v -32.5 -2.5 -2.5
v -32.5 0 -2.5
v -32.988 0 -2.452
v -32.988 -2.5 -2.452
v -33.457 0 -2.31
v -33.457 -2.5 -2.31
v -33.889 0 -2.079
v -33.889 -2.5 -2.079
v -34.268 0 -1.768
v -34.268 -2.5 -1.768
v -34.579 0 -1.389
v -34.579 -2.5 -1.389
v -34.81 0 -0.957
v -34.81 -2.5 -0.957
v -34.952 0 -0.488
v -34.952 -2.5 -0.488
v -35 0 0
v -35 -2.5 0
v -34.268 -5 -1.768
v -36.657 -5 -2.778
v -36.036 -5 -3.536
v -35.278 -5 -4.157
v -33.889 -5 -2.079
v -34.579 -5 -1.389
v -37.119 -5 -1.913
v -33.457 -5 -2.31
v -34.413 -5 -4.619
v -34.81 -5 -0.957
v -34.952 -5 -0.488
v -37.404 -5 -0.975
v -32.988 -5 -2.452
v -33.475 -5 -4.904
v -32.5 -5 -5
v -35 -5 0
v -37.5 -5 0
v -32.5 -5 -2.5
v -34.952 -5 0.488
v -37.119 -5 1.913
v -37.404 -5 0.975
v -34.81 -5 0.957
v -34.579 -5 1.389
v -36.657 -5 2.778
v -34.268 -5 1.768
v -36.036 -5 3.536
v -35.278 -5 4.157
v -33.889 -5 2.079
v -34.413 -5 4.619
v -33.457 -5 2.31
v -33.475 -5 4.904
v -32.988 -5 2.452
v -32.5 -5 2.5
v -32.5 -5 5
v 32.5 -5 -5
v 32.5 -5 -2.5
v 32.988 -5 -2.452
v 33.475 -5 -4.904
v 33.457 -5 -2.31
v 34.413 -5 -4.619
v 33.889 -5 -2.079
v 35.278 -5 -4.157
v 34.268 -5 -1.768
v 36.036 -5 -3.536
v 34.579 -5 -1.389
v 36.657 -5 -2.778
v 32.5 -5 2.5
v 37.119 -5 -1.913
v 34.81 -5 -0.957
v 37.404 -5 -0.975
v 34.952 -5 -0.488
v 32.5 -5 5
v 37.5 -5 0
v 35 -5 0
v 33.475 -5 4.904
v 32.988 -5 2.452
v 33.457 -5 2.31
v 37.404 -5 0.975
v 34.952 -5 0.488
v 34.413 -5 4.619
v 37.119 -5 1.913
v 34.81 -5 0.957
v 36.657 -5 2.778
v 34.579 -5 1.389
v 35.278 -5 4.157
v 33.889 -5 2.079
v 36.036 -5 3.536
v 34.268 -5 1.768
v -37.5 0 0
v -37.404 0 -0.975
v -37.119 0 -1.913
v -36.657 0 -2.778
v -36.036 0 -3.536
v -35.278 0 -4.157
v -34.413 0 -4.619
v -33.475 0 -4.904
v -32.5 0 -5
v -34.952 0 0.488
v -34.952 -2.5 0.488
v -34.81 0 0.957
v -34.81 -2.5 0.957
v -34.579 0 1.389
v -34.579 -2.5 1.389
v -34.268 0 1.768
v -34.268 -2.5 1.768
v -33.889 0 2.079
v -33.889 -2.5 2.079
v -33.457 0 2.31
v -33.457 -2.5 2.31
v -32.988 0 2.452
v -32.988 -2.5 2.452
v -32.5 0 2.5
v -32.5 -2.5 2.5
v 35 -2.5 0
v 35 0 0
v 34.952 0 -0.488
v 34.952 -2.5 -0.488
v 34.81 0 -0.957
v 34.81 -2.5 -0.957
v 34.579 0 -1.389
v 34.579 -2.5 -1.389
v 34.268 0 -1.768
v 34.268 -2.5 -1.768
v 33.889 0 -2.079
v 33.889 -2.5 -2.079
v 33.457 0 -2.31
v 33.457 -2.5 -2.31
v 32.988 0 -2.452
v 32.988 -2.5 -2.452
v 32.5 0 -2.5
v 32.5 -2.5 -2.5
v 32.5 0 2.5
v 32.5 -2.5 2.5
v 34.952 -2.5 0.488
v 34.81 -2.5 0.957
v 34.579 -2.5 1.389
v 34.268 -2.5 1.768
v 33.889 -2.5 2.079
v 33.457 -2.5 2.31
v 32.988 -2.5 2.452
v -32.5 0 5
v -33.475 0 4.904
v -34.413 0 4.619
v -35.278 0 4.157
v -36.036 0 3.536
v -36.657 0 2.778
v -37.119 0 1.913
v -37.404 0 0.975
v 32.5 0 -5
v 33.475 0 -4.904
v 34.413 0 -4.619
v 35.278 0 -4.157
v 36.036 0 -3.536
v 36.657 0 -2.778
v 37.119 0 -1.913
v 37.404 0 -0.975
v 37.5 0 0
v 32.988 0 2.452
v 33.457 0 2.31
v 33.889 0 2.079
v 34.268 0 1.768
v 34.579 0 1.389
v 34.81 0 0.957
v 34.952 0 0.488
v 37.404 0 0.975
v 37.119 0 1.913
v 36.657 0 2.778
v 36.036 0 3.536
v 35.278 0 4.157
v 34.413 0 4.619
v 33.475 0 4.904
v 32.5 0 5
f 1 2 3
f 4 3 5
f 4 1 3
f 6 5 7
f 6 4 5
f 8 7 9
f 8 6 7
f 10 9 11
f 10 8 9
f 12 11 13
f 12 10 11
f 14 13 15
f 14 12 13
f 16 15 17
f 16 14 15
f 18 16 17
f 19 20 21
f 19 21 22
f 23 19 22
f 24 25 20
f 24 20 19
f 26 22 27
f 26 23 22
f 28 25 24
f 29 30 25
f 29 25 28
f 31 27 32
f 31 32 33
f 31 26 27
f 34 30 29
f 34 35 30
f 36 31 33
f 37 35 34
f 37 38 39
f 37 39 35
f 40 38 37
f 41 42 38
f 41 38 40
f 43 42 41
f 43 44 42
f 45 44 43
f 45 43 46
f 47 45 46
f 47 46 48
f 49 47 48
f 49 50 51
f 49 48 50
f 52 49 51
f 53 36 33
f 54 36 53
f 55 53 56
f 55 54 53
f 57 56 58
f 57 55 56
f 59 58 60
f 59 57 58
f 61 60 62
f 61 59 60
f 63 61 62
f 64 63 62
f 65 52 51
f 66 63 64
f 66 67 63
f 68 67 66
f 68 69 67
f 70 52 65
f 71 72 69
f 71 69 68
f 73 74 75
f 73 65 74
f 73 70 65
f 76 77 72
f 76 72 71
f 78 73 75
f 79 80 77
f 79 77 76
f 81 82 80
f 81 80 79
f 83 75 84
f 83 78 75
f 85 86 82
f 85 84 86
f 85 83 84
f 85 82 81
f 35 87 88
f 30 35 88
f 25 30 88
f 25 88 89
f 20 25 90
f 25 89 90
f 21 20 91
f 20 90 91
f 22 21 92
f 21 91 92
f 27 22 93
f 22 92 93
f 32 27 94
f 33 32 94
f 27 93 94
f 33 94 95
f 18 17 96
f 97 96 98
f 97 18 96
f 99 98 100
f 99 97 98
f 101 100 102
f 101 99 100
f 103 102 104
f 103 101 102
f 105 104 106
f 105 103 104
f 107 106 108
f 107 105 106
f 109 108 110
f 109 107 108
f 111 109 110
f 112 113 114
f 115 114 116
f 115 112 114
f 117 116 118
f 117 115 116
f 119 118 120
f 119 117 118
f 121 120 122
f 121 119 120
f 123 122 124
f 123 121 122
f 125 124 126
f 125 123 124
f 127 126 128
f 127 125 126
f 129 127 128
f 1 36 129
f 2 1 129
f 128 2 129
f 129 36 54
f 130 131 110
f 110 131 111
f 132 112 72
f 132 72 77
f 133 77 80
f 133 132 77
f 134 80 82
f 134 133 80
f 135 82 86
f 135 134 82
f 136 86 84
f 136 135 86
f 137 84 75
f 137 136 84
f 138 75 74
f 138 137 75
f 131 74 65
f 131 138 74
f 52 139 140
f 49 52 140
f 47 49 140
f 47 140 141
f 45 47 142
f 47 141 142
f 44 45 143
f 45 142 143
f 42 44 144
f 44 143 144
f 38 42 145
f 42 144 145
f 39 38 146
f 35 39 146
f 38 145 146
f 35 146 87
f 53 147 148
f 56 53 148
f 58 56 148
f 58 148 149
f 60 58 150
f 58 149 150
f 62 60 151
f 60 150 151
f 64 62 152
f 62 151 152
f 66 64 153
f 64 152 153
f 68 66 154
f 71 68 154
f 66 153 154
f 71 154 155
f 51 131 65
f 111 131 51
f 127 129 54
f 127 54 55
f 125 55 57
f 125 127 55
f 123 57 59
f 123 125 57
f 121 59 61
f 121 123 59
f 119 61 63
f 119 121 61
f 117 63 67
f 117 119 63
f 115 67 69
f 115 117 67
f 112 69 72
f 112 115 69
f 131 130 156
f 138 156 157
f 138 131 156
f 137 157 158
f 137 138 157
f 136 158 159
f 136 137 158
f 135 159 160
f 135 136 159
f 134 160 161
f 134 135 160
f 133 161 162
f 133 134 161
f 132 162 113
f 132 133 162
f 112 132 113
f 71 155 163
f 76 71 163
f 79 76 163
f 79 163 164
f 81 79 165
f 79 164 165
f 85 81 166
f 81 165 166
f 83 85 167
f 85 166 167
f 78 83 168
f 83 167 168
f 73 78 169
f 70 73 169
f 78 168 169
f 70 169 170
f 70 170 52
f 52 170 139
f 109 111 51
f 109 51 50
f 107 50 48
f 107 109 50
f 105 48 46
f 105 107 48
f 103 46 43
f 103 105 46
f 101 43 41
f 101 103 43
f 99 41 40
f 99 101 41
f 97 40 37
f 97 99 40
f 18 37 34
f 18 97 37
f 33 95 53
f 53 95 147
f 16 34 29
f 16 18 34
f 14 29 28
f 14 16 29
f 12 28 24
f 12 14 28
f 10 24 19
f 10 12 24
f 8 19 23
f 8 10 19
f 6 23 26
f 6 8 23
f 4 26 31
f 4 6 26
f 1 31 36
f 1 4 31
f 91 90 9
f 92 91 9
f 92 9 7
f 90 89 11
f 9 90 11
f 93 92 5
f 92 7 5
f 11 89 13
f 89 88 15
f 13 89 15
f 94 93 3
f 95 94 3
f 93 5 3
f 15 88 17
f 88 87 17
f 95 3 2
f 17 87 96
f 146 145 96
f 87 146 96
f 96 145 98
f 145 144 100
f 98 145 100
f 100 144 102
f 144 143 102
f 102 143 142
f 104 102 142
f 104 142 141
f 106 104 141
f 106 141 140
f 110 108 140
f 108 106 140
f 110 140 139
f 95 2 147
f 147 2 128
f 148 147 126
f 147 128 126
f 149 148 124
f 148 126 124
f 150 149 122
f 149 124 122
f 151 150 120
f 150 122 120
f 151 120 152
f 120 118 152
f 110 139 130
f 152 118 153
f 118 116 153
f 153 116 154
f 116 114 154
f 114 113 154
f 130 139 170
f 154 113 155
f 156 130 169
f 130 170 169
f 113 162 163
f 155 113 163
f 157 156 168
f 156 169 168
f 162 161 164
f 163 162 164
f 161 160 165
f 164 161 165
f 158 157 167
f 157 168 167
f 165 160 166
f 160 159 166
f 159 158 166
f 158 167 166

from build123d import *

# Parameters (mm, degrees)
F1_DEPTH = 5
F2_T     = -2.5
F3_DEPTH = 25


with BuildPart() as f1:
    # F0 (on Front) → F1 (new body)
    with BuildSketch(Plane.XZ):
        with BuildLine():
            Line((-32.5, -5), (32.5, -5))
            ThreePointArc((32.5, -5), (36.0355339059, -3.5355339059), (37.5, 0))
            ThreePointArc((37.5, 0), (36.0355339059, 3.5355339059), (32.5, 5))
            Line((32.5, 5), (-32.5, 5))
            ThreePointArc((-32.5, 5), (-36.0355339059, 3.5355339059), (-37.5, 0))
            ThreePointArc((-37.5, 0), (-36.0355339059, -3.5355339059), (-32.5, -5))
        make_face()
    extrude(amount=F1_DEPTH)

    # F2
    f2_openings = [f1.faces().sort_by_distance(p)[0] for p in [
        (0, -5, 0),
    ]]
    offset(amount=F2_T, openings=f2_openings)

    # F3 (cut): a face of the model
    f3_faces = [f1.faces().sort_by_distance(p)[0] for p in [
        (0, -2.5, 0),
    ]]
    extrude(f3_faces, amount=-F3_DEPTH, mode=Mode.SUBTRACT)


solid = f1.part
